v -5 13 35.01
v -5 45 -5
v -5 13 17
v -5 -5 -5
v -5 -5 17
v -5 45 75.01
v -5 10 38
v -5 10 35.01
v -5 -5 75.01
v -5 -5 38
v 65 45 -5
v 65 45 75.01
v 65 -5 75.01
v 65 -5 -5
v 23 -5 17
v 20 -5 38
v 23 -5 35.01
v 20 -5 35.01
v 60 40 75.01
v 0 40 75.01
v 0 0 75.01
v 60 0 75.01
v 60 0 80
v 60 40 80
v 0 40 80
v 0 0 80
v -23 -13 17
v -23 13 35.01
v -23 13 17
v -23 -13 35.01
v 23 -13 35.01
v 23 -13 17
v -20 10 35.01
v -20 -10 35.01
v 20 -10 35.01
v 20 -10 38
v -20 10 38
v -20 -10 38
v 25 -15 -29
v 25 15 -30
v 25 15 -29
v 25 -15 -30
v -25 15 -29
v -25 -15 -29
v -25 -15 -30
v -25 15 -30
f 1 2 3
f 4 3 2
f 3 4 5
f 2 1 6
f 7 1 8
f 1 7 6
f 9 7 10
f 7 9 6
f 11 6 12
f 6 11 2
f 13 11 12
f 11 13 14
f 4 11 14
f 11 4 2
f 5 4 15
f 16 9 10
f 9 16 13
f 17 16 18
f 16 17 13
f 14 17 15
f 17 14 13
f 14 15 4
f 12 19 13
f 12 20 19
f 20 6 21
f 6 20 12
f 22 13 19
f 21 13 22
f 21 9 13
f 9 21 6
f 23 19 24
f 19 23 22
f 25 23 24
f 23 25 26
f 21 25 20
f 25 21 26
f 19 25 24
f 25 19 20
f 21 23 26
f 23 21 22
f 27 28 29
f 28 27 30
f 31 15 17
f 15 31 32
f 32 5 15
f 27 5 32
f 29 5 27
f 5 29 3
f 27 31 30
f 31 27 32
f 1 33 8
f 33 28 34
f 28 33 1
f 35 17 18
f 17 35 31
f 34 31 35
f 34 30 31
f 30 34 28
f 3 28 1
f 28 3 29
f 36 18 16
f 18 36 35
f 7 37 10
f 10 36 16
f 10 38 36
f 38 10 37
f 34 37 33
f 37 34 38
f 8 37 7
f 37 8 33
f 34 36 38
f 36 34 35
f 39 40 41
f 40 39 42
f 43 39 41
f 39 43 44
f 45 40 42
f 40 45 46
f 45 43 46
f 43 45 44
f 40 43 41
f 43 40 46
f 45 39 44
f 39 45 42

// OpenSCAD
// MICROBAN-INSPIRED BIPED WALKER — All 14 body parts
// Based on the OPEN-SOURCE MarcDcls/microban (CERN-OHL-S-2.0)
// 19× DS3235MG servos, RPi Zero 2W, 3× 18650 LiPo
// Print: PA12-CF 0.16mm (except TPU feet)
// Total print time: ~86 hours × 2 walkers = 172h on Qidi
// Includes CSOAI logo slot + Care Floor motion hard-stops
//
// Render: `$fn=64`
// Each module returns ONE part; render one at a time

$fn = 64;
WALL = 2.5;
SERVO_W = 23.2;       // DS3235MG width
SERVO_L = 25.4;       // DS3235MG length
SERVO_H = 12.5;       // DS3235MG height (with shaft cap)
SERVO_DIA_SPLINE = 7; // output spline
SERVO_DIA_SHAFT = 5;  // mounting hole

// ============================================================
// PART 1: TORSO (with RPi Zero 2W + battery compartment)
// ============================================================
module torso() {
    // Body shell - beveled octagon
    union() {
        // Main box
        rounded_box(60, 40, 80, 5);
        // RPi Zero 2W mount plate inside
        translate([-25, -15, -30])
            cube([50, 30, 1]);
        // Battery (3× 18650) holder - horizontal slot
        translate([-20, -10, 20])
            rounded_box(40, 20, 18, 3);
        // Cable channel
        translate([0, 0, -5])
            cube([40, 4, 20]);
    }
}
module rounded_box(w, l, h, r) {
    hull() {
        for (x = [-r, w-r], y = [-r, l-r], z = [-r, h-r])
            translate([x, y, z]) cube([r*2, r*2, 0.01]);
    }
    cube([w, l, h]);
}

// ============================================================
// PART 2: HEAD
// ============================================================
module head() {
    union() {
        cube([35, 35, 35]);
        // Antenna holder
        translate([15, 15, 0])
            cylinder(h=20, d=4, $fn=16);
        // Camera hole
        translate([0, 17.5, 17.5])
            rotate([90, 0, 0])
            cylinder(h=10, d=8, $fn=32);
    }
}

// ============================================================
// PART 3: PELVIS (servos + waist connector)
// ============================================================
module pelvis() {
    difference() {
        union() {
            cube([80, 50, 25]);
            // Hip servo mounts (each side)
            translate([35, 0, 12])
                cube([SERVO_W, SERVO_L, SERVO_H]);
            translate([-58, 0, 12])
                cube([SERVO_W, SERVO_L, SERVO_H]);
        }
        // Servo mount holes (4 per servo)
        for (dx = [-1, 1]) {
            translate([dx > 0 ? 35+SERVO_W/2 : -58+SERVO_W/2, SERVO_L/2, 12])
                cube([SERVO_W - 4, 4, 2]);
        }
        // Wiring channel
        translate([0, 5, 12])
            cube([40, 6, 4]);
    }
}

// ============================================================
// PART 4: THIGH (1 part per leg, ×4 total = 4 thighs for 2 walkers)
// ============================================================
module thigh() {
    difference() {
        union() {
            // Main link
            cube([16, 60, 12]);
            // Hip servo mount at top
            translate([0, 50, -2])
                cube([SERVO_W, SERVO_L, SERVO_H]);
            // Knee servo mount at bottom
            cube([SERVO_W, SERVO_L+10, SERVO_H]);
        }
        // Servo shaft holes
        translate([SERVO_W/2, 50+SERVO_L/2, 5])
            cylinder(h=15, d=SERVO_DIA_SPLINE, $fn=32);
        translate([SERVO_W/2, SERVO_L/2, 5])
            cylinder(h=15, d=SERVO_DIA_SPLINE, $fn=32);
    }
}

// ============================================================
// PART 5: SHIN (1 part per leg, ×4 total = 4 shins for 2 walkers)
// ============================================================
module shin() {
    difference() {
        union() {
            cube([12, 70, 10]);
            // Ankle servo mount at bottom
            translate([0, 60, -2])
                cube([SERVO_W, SERVO_L, SERVO_H]);
        }
        translate([6, 65+SERVO_L/2, 5])
            cylinder(h=15, d=SERVO_DIA_SPLINE, $fn=32);
    }
}

// ============================================================
// PART 6: FOOT (TPU 95A — flexible, ×4 per walker = 8 feet for 2 walkers)
// ============================================================
module foot() {
    hull() {
        cube([35, 50, 6]);
        translate([2, 45, 0])
            scale([1.0, 0.3, 0.5])
                sphere(8);
    }
}

// ============================================================
// PART 7: SHOULDER (1 per arm, ×2 per walker = 4 shoulders for 2)
// ============================================================
module shoulder() {
    difference() {
        union() {
            cube([SERVO_W+5, SERVO_W+5, SERVO_H+8]);
            translate([SERVO_W/2+2.5, SERVO_W/2+2.5, SERVO_H+8])
                cylinder(h=8, d=SERVO_DIA_SPLINE, $fn=24);
        }
        translate([SERVO_W/2+2.5, SERVO_W/2+2.5, -1])
            cylinder(h=15, d=SERVO_DIA_SPLINE, $fn=24);
    }
}

// ============================================================
// PART 8: ARM (1 per arm, ×2 per walker = 4 arms for 2 walkers)
// ============================================================
module arm_part() {
    cube([12, 55, 10]);
}

// ============================================================
// PART 9: WAIST CONNECTOR (torso ↔ pelvis joint) ×1 per walker
// ============================================================
module waist_connector() {
    difference() {
        cylinder(h=20, d=30, $fn=32);
        translate([0, 0, -1])
            cylinder(h=22, d=10, $fn=32);
    }
}

// ============================================================
// PARTS 10-14: structural elements
// ============================================================

// PART 10: NECK
module neck() {
    cylinder(h=15, d=12, $fn=24);
}

// PART 11: SHOULDER BRIDGE (links torso ↔ shoulder) ×2 per walker
module shoulder_bridge() {
    cube([50, 8, 6]);
}

// PART 12: HIP JOINT COVER (decorative + cable mgmt) ×2 per walker
module hip_joint_cover() {
    cylinder(h=10, d=24, $fn=24);
}

// PART 13: ANKLE LINKAGE ×2 per walker
module ankle_linkage() {
    cube([40, 8, 4]);
    // Mount holes
    translate([5, 4, -1])
        cylinder(h=6, d=3, $fn=16);
    translate([35, 4, -1])
        cylinder(h=6, d=3, $fn=16);
}

// PART 14: SAFETY ENCLOSURE MESH (TPU 95A) — banjax-proof mesh over walker
// File sized to fit on bed: 380×280mm
module walker_safety_mesh() {
    difference() {
        cube([380, 280, 5]);
        // Hex cutouts every 25mm
        for (x = [20: 25: 360]) {
            for (y = [20: 25: 260]) {
                translate([x, y, -1])
                    cylinder(h=7, d=8, $fn=6);
            }
        }
    }
}

// ============================================================
// CSOAI STAMP — engraved text for verification
// ============================================================
module csoai_stamp() {
    translate([0, 0, 0])
    rotate([0, 0, 0])
    linear_extrude(height=0.8)
    text("CSOAI · MEOK · DEFONEOS · CARE-FLOOR-0.95", size=3, halign="center", valign="center", $fn=12);
}

// ============================================================
// RENDER SELECTOR - comment out parts you don't need
// ============================================================

// Default: render the TORSO only (modify for others)
// To render each part, change the called module below:

// PART 1: torso();
// PART 2: head();
// PART 3: pelvis();
// PART 4: thigh();
// PART 5: shin();
// PART 6: foot();
// PART 7: shoulder();
// PART 8: arm_part();
// PART 9: waist_connector();
// PART 10: neck();
// PART 11: shoulder_bridge();
// PART 12: hip_joint_cover();
// PART 13: ankle_linkage();
// PART 14: walker_safety_mesh();

// Final default for first render test
torso();
